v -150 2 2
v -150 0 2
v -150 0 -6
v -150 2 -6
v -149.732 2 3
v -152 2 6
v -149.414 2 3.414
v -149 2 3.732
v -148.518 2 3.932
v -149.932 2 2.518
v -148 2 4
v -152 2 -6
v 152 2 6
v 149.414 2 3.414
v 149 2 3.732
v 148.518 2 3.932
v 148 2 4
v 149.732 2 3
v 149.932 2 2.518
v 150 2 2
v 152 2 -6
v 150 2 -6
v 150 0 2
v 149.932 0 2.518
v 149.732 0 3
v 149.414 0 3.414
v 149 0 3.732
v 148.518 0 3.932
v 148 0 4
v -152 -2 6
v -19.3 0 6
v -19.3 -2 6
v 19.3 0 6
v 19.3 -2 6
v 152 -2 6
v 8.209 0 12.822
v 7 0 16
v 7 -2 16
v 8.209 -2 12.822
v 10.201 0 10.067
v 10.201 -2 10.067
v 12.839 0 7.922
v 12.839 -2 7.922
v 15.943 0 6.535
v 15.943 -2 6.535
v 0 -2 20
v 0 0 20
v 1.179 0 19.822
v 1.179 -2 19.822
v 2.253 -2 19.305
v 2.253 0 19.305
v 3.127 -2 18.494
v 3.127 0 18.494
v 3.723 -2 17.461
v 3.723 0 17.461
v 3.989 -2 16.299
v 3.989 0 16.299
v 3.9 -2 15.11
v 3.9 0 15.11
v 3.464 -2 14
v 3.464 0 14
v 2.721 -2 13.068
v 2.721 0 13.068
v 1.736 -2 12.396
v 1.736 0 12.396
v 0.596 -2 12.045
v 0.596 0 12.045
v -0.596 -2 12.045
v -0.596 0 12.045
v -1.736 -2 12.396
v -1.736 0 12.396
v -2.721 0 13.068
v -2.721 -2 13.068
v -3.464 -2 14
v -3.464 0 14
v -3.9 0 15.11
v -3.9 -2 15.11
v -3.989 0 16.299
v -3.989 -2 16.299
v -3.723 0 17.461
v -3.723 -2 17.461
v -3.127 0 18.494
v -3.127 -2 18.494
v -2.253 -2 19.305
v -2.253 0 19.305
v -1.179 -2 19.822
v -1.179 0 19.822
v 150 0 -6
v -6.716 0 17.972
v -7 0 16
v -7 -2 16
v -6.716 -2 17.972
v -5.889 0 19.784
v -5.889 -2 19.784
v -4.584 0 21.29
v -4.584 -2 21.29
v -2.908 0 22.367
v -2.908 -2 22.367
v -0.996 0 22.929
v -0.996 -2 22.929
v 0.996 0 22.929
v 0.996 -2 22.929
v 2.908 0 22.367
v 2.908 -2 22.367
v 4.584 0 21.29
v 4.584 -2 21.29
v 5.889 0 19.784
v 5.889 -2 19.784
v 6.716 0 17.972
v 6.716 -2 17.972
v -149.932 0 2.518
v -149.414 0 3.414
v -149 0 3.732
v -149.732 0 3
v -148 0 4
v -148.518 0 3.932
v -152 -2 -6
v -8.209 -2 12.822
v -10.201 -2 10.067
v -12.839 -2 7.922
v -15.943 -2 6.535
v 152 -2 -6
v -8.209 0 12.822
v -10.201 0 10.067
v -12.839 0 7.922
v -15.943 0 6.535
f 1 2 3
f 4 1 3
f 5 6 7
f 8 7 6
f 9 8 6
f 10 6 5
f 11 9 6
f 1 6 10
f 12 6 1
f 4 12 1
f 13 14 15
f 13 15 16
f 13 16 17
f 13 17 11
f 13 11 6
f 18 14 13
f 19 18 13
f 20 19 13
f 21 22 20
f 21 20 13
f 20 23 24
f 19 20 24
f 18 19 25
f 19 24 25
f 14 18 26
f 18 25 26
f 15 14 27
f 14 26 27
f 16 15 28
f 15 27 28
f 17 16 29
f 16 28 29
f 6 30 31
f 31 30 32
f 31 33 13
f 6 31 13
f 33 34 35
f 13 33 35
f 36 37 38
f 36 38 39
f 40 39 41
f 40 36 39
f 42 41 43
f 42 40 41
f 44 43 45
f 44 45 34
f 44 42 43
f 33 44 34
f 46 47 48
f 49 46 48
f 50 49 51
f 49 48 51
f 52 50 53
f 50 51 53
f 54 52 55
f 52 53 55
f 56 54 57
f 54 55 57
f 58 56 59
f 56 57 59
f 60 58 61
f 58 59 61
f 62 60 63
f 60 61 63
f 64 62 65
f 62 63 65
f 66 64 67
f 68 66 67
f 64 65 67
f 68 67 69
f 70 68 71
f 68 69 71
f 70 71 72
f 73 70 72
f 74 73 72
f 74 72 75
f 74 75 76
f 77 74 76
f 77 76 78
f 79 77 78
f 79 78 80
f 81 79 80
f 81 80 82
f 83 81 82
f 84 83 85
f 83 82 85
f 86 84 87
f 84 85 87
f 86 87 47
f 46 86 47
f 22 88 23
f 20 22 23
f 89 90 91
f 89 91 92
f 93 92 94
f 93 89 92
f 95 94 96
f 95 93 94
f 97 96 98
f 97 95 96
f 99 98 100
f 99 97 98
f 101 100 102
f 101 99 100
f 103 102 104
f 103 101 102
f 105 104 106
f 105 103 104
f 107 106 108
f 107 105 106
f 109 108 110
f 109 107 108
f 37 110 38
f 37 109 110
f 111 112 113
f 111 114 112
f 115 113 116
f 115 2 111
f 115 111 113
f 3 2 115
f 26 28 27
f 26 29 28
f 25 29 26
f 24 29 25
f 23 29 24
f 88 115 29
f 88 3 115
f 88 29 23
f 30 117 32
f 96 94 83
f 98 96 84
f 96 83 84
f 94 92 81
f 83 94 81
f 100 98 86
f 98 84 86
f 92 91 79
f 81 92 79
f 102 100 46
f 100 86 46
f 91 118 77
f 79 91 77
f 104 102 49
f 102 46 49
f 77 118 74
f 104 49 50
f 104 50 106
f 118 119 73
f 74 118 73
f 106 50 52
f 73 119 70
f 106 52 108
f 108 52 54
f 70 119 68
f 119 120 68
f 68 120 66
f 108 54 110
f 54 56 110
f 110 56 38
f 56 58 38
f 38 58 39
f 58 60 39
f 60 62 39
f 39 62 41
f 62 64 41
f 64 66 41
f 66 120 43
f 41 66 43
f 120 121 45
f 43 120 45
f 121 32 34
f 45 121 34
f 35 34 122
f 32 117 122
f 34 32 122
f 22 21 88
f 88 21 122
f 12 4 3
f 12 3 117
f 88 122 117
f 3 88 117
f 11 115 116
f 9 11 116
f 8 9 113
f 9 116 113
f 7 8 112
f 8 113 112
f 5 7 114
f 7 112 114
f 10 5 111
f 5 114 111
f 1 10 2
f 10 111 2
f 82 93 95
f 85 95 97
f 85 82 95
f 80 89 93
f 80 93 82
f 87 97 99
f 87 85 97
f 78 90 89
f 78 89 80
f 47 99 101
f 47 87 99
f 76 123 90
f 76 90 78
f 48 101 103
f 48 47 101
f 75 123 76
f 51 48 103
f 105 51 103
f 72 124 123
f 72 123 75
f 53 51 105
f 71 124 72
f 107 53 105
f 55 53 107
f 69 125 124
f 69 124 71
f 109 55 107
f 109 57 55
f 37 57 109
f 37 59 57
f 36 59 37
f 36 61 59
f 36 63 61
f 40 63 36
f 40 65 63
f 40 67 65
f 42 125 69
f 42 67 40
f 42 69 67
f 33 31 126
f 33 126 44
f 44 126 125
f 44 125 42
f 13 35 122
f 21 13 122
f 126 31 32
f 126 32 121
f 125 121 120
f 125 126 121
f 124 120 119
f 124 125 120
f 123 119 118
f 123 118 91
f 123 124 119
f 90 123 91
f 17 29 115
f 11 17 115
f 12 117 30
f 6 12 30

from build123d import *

# Parameters (mm, degrees)
SKETCH2_R           = 7
SKETCH2_R_2         = 4
BOSS_EXTRUDE2_DEPTH = 2
BOSS_EXTRUDE4_START = -2
BOSS_EXTRUDE4_DEPTH = 4


with BuildPart() as part:
    # Sketch2 → Boss-Extrude2 (new body)
    # profile 1 of 3: a face of its own
    with BuildSketch(Plane(origin=(0, 0, 0), x_dir=(1, 0, 0), z_dir=(0, 1, 0))):
        with BuildLine():
            Line((-152, 6), (-152, -6))
            Line((-152, -6), (-20, -6))
            ThreePointArc((-20, -6), (-19.650225915, -5.99529369), (-19.300451831, -6))
            Line((-19.300451831, -6), (19.300451831, -6))
            ThreePointArc((19.300451831, -6), (19.650225915, -5.99529369), (20, -6))
            Line((20, -6), (152, -6))
            Line((152, -6), (152, 6))
            Line((152, 6), (-152, 6))
        make_face()
    # profile 2 of 3: a face of its own
    with BuildSketch(Plane(origin=(0, 0, 0), x_dir=(1, 0, 0), z_dir=(0, 1, 0))):
        with BuildLine():
            Line((19.300451831, -6), (-19.300451831, -6))
            ThreePointArc((-19.300451831, -6), (-11.449616182, -8.908173189), (-7, -16))
            ThreePointArc((-7, -16), (0, -9), (7, -16))
            ThreePointArc((7, -16), (11.449616182, -8.908173189), (19.300451831, -6))
        make_face()
    # profile 3 of 3: a face of its own
    with BuildSketch(Plane(origin=(0, 0, 0), x_dir=(1, 0, 0), z_dir=(0, 1, 0))):
        with Locations((0, -16)):
            Circle(SKETCH2_R)
        with Locations(Location((0, -16, 0), (0, 0, 270))):
            Circle(SKETCH2_R_2, mode=Mode.SUBTRACT)
    extrude(amount=-BOSS_EXTRUDE2_DEPTH)

    # Boss-Extrude4: read off the stored shape, not the designer's step
    # Boss-Extrude4 outline → Boss-Extrude4 (add)
    with BuildSketch(Plane(origin=(0, 0, 0), x_dir=(1, 0, 0), z_dir=(0, 1, 0)).offset(BOSS_EXTRUDE4_START)):
        with BuildLine():
            Line((-152, 6), (-152, -6))
            Line((-152, -6), (152, -6))
            Line((152, -6), (152, 6))
            Line((152, 6), (150, 6))
            Line((150, 6), (150, -2))
            ThreePointArc((150, -2), (149.414213562, -3.414213562), (148, -4))
            Line((148, -4), (-148, -4))
            ThreePointArc((-148, -4), (-149.414213562, -3.414213562), (-150, -2))
            Line((-150, -2), (-150, 6))
            Line((-150, 6), (-152, 6))
        make_face()
    extrude(amount=BOSS_EXTRUDE4_DEPTH)


solid = part.part
